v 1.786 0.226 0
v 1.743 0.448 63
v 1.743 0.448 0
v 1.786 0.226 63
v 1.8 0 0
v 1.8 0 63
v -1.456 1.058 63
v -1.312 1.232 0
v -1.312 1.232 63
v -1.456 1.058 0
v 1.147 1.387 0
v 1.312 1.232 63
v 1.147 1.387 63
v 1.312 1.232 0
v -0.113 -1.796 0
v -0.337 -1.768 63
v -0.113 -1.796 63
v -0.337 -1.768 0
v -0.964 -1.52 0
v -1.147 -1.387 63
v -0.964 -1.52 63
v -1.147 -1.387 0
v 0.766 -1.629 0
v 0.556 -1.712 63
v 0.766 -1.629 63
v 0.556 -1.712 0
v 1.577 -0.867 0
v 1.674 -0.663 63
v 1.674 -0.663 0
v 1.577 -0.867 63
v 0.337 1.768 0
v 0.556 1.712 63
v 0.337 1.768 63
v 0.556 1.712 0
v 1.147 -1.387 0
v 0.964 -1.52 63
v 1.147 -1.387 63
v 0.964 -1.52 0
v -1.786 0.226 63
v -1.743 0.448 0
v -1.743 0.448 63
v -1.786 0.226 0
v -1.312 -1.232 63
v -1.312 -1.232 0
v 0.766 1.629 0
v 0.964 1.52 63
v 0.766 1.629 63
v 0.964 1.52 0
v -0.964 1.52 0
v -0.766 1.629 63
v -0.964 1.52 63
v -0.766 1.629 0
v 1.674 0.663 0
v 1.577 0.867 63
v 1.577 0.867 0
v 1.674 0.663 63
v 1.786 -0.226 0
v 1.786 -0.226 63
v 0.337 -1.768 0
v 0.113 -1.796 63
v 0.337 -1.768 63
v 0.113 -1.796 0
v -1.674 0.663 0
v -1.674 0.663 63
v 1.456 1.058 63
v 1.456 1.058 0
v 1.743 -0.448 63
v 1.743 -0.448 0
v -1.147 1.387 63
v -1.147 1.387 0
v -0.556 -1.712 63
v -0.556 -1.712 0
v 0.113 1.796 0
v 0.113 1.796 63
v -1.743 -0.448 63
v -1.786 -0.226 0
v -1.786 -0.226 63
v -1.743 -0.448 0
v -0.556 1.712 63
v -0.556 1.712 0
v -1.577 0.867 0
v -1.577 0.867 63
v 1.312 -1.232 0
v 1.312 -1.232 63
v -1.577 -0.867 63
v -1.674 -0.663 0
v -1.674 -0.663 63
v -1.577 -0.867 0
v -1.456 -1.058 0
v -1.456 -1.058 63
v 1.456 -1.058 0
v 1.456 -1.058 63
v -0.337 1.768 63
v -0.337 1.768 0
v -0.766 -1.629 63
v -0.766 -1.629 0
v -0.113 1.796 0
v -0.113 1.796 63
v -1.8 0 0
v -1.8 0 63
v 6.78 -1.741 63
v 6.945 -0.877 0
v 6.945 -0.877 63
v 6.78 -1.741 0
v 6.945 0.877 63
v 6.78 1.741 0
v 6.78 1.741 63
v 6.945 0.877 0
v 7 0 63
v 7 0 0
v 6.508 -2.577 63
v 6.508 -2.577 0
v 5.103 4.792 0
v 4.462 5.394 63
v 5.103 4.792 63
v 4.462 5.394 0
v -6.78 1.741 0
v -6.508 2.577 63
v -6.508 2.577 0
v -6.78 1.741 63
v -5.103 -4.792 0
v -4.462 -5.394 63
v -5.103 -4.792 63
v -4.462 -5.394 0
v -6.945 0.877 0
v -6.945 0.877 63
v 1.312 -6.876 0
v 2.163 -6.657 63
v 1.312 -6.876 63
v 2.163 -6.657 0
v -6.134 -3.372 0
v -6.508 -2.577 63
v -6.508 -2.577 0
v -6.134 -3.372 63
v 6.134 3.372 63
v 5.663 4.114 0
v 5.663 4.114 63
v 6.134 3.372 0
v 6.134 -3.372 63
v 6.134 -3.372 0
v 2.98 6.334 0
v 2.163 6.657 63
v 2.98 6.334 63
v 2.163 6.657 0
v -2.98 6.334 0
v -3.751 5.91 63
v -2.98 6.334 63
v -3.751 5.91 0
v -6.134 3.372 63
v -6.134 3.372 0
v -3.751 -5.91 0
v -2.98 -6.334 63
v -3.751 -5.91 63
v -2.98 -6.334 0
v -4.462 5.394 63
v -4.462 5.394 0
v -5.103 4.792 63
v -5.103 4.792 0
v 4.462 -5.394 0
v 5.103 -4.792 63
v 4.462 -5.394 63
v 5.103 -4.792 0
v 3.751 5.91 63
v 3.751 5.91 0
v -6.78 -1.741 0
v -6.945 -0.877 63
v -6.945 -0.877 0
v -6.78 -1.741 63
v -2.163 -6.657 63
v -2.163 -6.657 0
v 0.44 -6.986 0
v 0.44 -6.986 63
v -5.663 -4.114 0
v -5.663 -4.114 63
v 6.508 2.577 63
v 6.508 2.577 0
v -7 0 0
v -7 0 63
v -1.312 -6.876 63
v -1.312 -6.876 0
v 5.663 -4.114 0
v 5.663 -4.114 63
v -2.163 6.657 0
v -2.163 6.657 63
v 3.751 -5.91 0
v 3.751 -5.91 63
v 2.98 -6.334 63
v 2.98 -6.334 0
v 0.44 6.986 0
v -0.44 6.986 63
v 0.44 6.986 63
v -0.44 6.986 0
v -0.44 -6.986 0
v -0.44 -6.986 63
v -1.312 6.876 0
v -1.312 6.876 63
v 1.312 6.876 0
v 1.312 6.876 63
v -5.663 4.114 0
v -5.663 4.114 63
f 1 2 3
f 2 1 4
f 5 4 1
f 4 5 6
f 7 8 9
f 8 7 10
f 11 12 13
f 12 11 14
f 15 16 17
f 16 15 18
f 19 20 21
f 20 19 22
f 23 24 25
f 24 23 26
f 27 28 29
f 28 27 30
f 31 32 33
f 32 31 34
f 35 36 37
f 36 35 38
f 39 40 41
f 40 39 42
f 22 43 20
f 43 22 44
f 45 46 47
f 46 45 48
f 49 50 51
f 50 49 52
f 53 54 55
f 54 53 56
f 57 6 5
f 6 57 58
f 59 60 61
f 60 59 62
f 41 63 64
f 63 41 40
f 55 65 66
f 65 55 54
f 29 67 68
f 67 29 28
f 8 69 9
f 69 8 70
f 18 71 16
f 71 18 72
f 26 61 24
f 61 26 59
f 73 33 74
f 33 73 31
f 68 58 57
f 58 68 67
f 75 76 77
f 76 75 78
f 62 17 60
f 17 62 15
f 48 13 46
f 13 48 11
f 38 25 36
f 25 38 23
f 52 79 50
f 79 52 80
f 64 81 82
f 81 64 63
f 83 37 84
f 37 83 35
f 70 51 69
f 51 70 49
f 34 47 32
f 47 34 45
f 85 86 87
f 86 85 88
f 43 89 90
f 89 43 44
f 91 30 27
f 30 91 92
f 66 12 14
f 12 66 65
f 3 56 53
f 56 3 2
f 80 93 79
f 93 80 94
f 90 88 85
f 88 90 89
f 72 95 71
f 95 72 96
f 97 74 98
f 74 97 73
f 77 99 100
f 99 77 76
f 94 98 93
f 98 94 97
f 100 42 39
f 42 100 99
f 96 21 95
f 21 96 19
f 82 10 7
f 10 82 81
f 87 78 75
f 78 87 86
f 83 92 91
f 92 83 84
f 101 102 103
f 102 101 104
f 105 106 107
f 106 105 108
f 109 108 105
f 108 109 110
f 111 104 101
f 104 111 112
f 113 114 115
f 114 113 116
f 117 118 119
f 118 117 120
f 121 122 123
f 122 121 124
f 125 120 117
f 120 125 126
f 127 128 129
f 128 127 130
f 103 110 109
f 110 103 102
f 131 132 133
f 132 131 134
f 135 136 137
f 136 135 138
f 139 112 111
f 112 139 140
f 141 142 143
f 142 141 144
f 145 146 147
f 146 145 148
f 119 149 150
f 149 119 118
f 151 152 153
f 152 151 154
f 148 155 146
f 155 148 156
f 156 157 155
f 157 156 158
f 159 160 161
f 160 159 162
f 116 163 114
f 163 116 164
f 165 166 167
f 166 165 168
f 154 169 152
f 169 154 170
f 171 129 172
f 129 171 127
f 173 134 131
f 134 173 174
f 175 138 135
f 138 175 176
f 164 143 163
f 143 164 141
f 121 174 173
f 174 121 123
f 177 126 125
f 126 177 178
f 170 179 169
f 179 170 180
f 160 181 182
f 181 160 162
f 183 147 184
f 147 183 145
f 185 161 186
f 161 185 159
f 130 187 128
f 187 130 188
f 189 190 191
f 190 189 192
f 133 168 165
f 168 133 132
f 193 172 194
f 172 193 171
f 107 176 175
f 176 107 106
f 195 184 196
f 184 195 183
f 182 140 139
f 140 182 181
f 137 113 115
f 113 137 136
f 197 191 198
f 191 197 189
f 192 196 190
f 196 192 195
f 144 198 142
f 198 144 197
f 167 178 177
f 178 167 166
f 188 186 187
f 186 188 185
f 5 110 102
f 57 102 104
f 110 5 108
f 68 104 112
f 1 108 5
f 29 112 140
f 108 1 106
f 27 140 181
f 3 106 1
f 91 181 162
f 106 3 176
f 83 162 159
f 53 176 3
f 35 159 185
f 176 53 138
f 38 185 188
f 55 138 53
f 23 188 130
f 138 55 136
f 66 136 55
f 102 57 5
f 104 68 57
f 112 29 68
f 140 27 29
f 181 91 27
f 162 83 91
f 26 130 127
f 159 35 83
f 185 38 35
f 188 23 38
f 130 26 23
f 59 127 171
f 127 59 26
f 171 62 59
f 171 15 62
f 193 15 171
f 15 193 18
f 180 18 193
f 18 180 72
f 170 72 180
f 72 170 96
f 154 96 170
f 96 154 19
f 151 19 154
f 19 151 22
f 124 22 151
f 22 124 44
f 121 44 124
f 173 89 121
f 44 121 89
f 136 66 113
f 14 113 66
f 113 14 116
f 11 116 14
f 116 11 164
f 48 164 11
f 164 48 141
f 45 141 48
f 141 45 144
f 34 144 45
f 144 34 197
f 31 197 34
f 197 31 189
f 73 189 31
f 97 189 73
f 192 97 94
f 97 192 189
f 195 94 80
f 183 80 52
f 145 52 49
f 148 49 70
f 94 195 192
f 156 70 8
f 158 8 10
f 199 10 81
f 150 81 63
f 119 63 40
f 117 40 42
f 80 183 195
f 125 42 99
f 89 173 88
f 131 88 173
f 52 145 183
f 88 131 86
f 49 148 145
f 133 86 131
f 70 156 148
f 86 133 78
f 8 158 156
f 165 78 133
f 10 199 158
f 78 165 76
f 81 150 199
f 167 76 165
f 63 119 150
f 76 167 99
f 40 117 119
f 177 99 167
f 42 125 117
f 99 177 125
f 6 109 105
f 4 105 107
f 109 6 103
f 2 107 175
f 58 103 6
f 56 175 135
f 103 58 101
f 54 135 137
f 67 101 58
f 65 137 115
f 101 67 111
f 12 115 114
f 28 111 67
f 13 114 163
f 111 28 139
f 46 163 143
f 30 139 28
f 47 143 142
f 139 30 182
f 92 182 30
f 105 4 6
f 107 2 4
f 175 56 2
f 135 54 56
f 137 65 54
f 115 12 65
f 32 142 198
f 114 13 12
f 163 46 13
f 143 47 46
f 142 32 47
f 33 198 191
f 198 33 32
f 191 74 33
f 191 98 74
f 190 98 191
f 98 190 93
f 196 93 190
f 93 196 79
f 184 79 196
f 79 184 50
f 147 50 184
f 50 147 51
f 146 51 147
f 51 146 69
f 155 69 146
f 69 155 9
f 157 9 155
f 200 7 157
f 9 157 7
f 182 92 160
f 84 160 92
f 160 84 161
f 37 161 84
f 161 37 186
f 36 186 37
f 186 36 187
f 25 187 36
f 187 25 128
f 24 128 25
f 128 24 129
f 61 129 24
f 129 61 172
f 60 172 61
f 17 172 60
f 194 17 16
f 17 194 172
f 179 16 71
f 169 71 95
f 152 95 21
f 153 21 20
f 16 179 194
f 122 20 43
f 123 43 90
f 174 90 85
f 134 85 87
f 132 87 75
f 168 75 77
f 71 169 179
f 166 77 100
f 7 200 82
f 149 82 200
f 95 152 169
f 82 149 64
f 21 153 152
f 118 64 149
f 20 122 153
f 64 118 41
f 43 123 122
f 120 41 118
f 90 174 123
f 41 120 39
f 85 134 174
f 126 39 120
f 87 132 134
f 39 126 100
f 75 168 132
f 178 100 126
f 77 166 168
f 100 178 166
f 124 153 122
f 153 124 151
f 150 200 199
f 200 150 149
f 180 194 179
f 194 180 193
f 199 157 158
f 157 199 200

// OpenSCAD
$fn = 50;


difference() {
	union() {
		cylinder(h = 63, r = 7.0000000000);
	}
	union() {
		translate(v = [0, 0, -100]) {
			cylinder(h = 200, r = 1.8000000000);
		}
		translate(v = [0, 0, -100]) {
			cylinder(h = 200, r = 1.8000000000);
		}
	}
}
